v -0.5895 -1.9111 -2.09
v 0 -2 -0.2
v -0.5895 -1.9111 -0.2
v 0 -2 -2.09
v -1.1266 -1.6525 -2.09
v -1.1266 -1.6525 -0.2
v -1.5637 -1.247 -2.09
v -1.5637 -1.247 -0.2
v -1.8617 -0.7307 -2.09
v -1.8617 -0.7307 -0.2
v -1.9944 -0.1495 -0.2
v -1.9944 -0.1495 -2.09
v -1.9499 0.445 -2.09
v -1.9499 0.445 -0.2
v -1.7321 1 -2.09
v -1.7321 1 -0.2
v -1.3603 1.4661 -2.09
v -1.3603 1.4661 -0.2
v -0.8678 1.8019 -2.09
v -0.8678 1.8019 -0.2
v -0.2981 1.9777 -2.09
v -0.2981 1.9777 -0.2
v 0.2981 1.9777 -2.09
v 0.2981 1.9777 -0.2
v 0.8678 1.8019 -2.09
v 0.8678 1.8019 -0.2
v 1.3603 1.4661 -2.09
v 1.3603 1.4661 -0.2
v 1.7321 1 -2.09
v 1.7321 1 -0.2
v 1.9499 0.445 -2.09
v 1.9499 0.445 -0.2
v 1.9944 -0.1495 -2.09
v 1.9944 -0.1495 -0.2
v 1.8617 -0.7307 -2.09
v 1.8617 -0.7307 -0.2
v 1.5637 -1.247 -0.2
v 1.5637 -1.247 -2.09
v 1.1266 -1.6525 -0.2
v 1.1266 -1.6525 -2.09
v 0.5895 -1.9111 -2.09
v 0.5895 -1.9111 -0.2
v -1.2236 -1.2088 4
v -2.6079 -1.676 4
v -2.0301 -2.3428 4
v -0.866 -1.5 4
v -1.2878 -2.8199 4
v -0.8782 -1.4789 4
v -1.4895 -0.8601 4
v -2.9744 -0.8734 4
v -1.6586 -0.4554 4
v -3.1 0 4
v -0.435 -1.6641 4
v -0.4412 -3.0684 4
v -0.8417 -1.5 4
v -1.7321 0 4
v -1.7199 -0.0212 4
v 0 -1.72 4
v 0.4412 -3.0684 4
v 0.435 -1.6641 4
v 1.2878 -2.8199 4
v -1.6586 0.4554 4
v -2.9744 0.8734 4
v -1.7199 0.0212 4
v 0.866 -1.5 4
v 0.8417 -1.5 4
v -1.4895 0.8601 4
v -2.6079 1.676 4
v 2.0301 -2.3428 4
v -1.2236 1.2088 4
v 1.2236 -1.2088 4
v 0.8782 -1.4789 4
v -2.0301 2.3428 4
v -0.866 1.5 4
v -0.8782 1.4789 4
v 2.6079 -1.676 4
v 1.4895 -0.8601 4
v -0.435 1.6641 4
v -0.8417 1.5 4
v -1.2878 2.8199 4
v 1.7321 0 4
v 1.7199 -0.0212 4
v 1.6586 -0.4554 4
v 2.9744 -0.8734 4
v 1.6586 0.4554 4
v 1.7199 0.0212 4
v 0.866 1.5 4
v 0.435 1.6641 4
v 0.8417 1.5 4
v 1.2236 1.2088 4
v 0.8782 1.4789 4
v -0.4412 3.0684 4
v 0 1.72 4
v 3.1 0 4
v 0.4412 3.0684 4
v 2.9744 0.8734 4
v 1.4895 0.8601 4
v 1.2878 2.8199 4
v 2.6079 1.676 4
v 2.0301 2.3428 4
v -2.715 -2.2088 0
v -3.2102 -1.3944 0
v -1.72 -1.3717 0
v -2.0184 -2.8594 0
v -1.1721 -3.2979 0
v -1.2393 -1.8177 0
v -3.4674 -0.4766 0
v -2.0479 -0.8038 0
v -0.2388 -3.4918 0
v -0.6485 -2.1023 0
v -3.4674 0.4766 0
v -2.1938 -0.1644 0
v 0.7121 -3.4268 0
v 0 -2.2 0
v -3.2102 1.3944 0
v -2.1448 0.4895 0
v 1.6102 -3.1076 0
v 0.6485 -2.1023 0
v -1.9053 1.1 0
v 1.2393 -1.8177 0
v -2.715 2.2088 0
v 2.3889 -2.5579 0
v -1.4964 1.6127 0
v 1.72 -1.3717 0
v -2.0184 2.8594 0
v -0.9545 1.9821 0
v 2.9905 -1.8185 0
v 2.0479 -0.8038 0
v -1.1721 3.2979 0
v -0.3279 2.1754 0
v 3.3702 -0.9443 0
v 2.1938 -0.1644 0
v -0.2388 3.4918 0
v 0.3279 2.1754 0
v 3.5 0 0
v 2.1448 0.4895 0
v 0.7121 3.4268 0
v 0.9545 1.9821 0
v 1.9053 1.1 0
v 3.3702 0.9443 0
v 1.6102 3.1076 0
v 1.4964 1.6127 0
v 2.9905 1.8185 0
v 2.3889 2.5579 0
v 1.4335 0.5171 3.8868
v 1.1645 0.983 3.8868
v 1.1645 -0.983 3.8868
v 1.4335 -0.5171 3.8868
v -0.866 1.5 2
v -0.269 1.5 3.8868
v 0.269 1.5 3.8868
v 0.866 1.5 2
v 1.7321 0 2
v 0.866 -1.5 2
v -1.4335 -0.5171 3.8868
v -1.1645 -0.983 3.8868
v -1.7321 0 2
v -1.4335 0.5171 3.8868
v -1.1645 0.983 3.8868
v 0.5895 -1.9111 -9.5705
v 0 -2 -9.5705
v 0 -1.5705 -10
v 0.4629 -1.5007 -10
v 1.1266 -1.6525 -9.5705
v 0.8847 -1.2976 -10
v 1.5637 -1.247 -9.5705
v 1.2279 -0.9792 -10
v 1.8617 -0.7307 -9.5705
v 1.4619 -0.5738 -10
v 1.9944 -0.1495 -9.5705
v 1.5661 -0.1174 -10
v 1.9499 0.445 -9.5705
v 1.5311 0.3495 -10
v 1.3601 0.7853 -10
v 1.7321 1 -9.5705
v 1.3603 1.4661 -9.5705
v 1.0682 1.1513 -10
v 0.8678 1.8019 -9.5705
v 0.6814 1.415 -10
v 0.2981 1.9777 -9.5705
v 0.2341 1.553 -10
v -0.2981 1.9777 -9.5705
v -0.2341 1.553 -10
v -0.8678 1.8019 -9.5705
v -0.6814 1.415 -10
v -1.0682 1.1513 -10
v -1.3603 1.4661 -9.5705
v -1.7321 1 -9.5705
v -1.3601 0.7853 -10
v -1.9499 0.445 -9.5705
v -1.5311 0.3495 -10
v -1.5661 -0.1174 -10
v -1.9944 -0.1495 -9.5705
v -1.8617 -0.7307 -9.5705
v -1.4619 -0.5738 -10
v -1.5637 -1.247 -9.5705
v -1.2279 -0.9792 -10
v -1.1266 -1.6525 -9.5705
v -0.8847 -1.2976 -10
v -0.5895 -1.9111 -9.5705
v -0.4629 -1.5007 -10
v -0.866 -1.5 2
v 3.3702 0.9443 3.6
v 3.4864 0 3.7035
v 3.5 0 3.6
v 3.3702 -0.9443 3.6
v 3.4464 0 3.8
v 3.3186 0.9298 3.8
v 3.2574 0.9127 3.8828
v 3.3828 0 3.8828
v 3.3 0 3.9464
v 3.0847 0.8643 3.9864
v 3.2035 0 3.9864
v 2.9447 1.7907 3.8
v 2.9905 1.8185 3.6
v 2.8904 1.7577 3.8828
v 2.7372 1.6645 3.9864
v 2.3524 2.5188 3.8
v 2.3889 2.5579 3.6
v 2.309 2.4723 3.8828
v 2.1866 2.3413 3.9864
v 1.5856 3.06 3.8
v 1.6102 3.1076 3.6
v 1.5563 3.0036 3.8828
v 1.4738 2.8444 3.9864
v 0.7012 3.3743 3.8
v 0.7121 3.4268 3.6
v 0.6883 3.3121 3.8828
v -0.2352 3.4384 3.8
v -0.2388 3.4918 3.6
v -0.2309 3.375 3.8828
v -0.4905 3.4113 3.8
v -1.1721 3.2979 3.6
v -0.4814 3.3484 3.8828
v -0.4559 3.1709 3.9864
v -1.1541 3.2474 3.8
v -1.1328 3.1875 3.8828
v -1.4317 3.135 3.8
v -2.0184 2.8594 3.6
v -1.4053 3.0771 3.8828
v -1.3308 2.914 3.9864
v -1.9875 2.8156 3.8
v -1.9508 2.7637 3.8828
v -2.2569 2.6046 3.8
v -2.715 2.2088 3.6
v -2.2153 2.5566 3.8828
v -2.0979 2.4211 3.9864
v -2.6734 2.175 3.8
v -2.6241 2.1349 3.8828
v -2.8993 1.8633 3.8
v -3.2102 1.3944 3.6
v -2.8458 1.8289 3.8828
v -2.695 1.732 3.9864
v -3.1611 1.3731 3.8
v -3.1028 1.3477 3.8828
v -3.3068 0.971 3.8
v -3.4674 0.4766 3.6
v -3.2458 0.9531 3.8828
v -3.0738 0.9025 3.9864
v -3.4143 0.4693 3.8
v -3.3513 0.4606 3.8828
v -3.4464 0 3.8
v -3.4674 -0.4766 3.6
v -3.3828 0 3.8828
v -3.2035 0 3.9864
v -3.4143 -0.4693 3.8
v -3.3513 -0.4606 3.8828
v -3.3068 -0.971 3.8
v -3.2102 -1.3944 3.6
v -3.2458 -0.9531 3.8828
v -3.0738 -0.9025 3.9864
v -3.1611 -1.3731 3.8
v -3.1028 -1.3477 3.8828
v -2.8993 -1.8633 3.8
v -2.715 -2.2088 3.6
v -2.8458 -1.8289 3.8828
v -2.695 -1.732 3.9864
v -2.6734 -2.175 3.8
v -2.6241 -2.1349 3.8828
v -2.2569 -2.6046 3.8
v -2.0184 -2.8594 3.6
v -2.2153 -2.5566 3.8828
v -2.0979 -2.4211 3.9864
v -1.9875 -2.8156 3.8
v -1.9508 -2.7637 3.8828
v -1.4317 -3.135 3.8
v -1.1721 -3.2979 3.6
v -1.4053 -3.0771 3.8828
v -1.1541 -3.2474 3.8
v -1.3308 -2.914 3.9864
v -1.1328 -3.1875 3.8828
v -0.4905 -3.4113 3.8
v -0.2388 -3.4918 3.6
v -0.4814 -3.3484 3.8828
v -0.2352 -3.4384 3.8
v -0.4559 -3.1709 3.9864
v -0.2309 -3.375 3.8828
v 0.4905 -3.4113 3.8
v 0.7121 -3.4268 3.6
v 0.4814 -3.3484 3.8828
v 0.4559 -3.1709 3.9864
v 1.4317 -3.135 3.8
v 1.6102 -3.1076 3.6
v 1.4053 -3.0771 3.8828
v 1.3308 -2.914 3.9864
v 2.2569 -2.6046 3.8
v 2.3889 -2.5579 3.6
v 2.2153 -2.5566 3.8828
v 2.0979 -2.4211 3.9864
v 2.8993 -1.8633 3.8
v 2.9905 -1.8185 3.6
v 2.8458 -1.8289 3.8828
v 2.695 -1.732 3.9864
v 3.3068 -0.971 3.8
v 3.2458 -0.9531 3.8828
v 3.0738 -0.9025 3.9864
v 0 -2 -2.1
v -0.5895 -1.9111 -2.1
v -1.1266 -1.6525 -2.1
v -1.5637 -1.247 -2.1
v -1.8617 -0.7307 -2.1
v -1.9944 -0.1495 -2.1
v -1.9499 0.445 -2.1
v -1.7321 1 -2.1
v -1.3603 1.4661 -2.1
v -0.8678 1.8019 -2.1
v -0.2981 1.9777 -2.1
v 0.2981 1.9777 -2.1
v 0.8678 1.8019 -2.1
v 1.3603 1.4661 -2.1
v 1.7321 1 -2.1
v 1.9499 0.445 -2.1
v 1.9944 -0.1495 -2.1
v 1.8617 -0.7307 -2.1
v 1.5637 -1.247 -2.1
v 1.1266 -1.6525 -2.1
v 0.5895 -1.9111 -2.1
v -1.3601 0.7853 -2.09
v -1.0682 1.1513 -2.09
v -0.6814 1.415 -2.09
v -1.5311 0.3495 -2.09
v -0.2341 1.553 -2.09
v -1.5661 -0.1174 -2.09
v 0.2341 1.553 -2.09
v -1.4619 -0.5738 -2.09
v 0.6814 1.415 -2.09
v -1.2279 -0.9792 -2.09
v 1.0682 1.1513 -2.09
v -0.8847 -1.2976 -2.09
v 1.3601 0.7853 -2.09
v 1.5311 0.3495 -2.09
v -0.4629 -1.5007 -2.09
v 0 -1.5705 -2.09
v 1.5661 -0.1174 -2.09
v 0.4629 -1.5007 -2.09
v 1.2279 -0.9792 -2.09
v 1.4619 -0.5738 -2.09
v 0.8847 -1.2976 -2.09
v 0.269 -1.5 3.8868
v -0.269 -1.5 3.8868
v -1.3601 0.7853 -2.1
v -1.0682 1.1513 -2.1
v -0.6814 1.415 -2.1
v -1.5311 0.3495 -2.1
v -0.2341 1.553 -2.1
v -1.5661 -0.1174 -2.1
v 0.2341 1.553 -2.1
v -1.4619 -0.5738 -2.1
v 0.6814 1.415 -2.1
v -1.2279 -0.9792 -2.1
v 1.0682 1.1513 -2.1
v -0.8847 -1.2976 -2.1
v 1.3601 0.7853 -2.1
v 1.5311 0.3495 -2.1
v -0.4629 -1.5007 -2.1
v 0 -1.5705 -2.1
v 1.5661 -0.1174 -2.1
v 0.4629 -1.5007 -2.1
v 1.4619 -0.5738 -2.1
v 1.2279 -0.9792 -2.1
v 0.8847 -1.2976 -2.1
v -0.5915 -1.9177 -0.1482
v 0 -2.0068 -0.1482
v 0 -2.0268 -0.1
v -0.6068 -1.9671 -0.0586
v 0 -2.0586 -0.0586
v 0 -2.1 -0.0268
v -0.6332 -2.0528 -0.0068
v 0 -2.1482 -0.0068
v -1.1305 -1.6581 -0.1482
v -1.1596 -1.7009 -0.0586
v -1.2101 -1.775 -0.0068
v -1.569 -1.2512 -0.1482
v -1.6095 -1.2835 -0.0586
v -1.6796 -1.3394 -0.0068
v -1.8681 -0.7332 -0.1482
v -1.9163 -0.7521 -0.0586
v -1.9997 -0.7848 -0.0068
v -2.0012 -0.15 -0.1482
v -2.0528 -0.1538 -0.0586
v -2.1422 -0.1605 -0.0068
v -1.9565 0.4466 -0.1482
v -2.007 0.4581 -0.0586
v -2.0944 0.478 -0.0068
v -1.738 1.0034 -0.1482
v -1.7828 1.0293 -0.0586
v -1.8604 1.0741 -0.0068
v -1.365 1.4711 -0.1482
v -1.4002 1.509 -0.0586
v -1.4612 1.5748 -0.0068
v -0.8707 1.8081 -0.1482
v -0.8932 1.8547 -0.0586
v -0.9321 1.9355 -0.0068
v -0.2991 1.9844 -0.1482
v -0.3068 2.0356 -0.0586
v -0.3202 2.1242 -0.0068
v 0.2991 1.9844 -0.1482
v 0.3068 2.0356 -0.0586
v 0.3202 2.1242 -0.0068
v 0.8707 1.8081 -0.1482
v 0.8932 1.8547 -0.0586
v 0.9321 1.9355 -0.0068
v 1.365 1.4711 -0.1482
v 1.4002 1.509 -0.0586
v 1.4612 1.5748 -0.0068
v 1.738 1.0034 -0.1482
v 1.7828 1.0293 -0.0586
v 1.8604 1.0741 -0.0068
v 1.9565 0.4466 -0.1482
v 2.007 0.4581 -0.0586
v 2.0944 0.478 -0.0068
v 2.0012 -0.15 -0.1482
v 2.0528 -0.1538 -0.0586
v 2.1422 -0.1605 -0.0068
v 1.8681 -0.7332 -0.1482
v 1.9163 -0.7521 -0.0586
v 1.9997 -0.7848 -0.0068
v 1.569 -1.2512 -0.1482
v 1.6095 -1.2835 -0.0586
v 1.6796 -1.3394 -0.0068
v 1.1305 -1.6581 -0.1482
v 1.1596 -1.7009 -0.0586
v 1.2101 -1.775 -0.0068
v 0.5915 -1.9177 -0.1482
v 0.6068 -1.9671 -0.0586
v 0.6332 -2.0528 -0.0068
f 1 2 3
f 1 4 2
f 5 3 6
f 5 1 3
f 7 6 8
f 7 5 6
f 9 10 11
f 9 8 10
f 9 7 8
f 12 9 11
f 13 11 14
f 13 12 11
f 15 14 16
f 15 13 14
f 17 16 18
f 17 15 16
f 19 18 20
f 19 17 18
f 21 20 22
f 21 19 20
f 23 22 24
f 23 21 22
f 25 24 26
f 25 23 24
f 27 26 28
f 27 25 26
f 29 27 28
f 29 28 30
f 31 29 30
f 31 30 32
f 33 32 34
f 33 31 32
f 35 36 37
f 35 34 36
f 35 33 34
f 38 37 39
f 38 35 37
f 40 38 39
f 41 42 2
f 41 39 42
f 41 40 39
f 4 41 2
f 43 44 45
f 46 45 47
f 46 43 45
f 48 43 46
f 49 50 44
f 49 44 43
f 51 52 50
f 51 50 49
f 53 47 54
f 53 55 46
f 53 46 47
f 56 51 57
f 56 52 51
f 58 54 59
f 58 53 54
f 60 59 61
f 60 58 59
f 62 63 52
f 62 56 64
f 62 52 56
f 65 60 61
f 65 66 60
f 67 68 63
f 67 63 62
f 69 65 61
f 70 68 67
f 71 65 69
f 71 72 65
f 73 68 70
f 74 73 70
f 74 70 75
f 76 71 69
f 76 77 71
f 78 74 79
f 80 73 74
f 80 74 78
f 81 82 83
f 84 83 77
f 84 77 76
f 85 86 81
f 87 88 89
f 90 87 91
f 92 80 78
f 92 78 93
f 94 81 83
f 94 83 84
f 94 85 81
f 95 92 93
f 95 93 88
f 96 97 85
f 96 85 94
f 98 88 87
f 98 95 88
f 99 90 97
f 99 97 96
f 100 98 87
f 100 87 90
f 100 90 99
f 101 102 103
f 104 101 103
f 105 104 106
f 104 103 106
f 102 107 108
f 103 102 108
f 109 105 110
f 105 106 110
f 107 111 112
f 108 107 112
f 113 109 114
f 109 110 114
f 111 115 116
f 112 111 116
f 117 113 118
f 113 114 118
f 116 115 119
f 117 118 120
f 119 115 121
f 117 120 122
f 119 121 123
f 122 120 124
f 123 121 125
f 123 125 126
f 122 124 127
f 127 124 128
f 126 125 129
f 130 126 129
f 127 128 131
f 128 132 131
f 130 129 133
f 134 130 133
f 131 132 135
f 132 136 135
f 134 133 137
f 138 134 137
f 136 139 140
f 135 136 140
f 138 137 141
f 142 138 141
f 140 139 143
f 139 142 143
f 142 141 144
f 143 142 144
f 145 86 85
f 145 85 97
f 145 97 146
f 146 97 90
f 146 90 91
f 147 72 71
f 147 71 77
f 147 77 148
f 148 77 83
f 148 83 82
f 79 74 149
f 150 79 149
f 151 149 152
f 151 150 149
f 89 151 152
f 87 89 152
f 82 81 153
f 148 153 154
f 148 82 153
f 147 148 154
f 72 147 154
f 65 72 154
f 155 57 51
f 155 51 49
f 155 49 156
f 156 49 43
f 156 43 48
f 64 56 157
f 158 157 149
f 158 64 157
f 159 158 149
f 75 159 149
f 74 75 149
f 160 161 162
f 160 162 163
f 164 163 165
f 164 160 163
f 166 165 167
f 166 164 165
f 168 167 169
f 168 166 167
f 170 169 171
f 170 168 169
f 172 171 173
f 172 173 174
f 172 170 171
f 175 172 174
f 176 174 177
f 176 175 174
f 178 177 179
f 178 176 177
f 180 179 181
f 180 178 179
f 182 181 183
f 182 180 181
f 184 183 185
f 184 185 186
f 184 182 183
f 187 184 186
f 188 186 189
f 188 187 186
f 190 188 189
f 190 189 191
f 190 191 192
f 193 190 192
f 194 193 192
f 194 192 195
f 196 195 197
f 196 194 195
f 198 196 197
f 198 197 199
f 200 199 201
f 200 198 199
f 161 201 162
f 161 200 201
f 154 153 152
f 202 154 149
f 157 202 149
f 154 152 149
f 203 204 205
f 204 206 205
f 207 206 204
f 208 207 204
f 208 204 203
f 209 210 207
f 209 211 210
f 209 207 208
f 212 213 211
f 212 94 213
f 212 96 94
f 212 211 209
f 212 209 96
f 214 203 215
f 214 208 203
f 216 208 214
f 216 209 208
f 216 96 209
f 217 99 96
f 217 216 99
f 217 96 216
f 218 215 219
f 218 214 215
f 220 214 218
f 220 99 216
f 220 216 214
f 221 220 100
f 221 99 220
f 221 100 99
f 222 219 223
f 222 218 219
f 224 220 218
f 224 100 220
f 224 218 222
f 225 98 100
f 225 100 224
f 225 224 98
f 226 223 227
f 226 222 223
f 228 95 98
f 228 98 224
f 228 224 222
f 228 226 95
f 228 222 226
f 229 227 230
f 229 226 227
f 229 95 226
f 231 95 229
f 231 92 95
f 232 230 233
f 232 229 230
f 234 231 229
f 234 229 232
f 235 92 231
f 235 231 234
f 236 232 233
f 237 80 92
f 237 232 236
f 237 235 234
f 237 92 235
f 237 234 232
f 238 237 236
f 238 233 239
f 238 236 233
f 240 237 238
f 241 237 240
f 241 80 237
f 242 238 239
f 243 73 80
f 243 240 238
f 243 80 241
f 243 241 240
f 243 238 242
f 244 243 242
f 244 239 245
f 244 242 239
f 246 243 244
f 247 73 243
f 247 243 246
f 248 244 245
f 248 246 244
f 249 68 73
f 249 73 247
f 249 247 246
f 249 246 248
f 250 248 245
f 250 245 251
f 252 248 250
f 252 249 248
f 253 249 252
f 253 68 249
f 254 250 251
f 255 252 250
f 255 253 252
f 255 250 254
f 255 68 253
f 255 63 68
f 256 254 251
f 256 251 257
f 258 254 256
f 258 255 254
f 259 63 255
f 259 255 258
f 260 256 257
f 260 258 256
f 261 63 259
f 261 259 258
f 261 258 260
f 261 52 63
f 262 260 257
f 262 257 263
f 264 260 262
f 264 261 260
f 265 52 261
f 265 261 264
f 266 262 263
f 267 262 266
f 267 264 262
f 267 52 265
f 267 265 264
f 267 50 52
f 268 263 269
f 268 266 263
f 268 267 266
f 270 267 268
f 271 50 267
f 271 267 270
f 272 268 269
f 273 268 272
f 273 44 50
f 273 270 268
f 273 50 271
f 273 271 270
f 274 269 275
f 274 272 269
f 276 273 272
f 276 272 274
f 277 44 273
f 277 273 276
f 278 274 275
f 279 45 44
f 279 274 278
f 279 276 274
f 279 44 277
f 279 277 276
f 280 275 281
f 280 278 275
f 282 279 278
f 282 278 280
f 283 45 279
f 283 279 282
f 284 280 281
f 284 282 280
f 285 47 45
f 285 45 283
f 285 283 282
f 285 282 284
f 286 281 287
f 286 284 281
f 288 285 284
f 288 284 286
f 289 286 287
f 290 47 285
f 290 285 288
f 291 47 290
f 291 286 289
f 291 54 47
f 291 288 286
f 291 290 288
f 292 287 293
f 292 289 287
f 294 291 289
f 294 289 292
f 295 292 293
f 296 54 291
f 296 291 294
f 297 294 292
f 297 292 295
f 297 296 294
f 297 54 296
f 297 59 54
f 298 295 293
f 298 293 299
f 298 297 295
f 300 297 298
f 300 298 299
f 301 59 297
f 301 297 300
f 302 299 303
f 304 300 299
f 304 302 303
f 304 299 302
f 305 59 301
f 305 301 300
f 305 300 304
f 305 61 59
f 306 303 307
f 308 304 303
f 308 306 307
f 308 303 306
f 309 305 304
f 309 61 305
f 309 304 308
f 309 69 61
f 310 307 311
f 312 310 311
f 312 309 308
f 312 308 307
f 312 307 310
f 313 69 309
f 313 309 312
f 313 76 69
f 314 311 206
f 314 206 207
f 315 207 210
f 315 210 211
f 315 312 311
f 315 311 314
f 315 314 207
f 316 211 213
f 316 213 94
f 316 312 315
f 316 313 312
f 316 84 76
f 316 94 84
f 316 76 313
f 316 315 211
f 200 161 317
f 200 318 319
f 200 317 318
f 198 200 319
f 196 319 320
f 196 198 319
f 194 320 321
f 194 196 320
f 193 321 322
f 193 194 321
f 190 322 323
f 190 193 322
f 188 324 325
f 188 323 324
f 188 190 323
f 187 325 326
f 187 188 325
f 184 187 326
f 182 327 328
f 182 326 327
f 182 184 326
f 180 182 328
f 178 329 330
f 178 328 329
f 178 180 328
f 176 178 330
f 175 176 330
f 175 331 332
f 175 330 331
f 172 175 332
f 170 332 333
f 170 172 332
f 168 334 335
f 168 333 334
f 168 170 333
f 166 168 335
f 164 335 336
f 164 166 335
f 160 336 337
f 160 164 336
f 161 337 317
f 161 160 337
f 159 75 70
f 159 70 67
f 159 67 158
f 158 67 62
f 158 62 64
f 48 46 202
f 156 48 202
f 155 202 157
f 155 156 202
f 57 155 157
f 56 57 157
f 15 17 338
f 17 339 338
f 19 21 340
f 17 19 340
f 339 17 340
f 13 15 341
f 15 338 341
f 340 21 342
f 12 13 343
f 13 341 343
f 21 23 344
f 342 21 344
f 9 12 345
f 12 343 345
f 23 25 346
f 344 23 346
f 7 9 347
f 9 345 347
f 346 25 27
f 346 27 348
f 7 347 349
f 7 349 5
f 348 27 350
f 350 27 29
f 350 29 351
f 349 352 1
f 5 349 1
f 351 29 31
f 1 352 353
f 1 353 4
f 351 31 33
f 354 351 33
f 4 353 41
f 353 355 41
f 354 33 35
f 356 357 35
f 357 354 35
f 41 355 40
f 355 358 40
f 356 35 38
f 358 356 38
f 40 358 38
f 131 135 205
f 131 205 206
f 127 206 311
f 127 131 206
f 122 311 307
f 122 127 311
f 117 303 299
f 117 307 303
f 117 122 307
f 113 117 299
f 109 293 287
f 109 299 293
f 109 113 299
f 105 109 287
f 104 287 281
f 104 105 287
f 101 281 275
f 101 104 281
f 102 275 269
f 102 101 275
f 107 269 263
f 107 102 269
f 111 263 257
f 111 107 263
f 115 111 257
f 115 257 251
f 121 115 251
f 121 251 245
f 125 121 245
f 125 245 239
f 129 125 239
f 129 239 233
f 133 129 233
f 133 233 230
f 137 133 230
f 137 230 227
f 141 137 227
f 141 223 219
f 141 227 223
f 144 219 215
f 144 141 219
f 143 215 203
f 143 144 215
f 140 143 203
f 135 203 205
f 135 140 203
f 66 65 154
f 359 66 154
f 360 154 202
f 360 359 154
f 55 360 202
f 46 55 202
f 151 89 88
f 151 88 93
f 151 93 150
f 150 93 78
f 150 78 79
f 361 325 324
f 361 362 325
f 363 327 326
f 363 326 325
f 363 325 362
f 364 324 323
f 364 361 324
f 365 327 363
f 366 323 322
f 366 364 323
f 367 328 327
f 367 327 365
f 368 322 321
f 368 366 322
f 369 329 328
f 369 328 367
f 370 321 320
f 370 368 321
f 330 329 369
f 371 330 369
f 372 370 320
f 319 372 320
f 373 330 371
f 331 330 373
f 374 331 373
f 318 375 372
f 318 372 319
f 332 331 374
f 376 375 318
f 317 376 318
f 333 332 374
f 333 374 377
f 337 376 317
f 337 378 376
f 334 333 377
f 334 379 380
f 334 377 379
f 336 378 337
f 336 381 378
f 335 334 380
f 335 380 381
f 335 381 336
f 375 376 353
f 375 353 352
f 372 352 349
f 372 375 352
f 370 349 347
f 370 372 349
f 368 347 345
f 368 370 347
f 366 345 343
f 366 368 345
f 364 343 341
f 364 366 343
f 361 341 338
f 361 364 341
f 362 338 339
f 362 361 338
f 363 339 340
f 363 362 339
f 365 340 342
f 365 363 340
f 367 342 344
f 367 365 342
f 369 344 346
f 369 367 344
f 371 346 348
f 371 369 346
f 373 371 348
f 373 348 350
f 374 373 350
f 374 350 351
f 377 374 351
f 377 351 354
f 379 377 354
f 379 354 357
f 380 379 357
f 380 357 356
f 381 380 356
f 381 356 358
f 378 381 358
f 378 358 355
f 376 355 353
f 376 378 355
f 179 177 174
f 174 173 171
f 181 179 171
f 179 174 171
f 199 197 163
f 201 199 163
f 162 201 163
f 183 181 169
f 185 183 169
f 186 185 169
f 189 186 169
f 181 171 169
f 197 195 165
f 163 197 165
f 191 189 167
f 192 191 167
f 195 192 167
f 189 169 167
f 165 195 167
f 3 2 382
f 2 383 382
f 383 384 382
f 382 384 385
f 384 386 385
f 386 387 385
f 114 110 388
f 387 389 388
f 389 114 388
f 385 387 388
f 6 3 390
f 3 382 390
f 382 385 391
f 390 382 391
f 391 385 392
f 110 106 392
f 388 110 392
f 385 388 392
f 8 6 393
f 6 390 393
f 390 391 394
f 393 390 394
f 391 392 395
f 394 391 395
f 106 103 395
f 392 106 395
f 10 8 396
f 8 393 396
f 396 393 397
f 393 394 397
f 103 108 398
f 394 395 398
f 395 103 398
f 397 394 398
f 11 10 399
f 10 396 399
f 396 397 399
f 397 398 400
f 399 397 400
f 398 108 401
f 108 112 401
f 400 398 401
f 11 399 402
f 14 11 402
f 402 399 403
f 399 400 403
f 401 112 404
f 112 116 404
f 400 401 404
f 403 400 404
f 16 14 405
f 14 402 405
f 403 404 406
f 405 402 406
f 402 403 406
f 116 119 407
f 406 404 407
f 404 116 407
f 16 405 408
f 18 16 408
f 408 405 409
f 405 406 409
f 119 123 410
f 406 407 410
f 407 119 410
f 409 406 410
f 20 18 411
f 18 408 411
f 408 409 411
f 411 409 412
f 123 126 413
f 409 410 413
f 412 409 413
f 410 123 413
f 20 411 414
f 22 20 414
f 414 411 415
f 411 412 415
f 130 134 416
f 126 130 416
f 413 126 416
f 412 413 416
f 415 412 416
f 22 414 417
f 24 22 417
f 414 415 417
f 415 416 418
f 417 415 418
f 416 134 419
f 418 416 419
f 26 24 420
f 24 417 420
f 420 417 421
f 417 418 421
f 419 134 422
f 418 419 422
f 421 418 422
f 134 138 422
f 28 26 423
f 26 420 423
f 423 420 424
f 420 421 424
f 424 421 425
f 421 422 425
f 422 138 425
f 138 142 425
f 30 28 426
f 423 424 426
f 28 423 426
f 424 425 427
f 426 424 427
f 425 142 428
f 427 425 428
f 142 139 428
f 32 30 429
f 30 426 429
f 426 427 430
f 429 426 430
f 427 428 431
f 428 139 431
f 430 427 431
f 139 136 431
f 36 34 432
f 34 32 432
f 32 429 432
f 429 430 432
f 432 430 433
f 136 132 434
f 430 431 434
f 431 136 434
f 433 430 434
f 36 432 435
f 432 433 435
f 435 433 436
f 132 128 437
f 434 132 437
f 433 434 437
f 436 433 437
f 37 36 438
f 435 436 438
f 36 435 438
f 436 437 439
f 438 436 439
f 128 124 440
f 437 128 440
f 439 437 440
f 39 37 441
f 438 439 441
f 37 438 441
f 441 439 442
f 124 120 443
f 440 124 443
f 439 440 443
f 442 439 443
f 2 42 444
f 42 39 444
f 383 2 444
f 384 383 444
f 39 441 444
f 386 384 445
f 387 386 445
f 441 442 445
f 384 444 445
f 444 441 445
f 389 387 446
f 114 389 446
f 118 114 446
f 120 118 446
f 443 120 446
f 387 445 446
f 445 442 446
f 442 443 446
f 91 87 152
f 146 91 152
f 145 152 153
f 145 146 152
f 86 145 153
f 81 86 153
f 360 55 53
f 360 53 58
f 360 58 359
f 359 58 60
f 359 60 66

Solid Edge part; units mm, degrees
sketch "Sketch1" plane through (0, 0, 0) normal (0, 0, 1) x (1, 0, 0)
  circle A0 centre (0, 0) radius 3.5
extrude "Protrusion1" add sketch "Sketch1" along normal blind 4
sketch "Sketch2" plane through (0, 0, 4) normal (0, 0, 1) x (0, 1, 0)
  line L0 (0, 1.7321) -> (1.5, 0.866)
  line L1 (1.5, 0.866) -> (1.5, -0.866)
  line L2 (1.5, -0.866) -> (0, -1.7321)
  line L3 (0, -1.7321) -> (-1.5, -0.866)
  line L4 (-1.5, -0.866) -> (-1.5, 0.866)
  line L5 (-1.5, 0.866) -> (0, 1.7321)
extrude "Cutout1" cut sketch "Sketch2" against normal blind 2
fillet "Round1" radius 0.4 1 edges at (-3.5, 0, 4)
sketch "Sketch3" plane through (0, 0, 0) normal (1, 0, 0) x (0, 1, 0)
  line L0 (-1.5705, -10) -> (0, -10)
  line L1 (-2, -9.5705) -> (-1.5705, -10)
  line L2 (-2, -2.1) -> (-2, -9.5705)
  line L3 (-1.5705, -2.1) -> (-2, -2.1)
  line L4 (-1.5705, -2.09) -> (-1.5705, -2.1)
  line L5 (-2, -2.09) -> (-1.5705, -2.09)
  line L6 (-2, -0.2) -> (-2, -2.09)
  arc A0 (-2, -0.2) -> (-2.2, 0) centre (-2.2, -0.2) ccw
  dimension "D1" = 2.1
  dimension "D2" = 0.01
  dimension "D3" = 0.2
  dimension "D4" = 10
revolve "RevolvedProtrusion1" add sketch "Sketch3" angle 360 about axis through (0, 0, -60.325) along (0, 0, 1) material side at (0, -0.7853, -9.95)
cosmetic_thread "Thread1" size "M4"
sketch "Sketch4" plane through (0, 0, 0) normal (0, -1, 0) x (1, 0, 0)
  line L0 (-1.72, 4) -> (0, 3.007)
revolve "RevolvedCutout1" cut sketch "Sketch4" angle 360 about axis through (0, 0, 57.15) along (0, 0, -1) material side at (-0.835, 0, 3.5468)
properties material "Stahl"
